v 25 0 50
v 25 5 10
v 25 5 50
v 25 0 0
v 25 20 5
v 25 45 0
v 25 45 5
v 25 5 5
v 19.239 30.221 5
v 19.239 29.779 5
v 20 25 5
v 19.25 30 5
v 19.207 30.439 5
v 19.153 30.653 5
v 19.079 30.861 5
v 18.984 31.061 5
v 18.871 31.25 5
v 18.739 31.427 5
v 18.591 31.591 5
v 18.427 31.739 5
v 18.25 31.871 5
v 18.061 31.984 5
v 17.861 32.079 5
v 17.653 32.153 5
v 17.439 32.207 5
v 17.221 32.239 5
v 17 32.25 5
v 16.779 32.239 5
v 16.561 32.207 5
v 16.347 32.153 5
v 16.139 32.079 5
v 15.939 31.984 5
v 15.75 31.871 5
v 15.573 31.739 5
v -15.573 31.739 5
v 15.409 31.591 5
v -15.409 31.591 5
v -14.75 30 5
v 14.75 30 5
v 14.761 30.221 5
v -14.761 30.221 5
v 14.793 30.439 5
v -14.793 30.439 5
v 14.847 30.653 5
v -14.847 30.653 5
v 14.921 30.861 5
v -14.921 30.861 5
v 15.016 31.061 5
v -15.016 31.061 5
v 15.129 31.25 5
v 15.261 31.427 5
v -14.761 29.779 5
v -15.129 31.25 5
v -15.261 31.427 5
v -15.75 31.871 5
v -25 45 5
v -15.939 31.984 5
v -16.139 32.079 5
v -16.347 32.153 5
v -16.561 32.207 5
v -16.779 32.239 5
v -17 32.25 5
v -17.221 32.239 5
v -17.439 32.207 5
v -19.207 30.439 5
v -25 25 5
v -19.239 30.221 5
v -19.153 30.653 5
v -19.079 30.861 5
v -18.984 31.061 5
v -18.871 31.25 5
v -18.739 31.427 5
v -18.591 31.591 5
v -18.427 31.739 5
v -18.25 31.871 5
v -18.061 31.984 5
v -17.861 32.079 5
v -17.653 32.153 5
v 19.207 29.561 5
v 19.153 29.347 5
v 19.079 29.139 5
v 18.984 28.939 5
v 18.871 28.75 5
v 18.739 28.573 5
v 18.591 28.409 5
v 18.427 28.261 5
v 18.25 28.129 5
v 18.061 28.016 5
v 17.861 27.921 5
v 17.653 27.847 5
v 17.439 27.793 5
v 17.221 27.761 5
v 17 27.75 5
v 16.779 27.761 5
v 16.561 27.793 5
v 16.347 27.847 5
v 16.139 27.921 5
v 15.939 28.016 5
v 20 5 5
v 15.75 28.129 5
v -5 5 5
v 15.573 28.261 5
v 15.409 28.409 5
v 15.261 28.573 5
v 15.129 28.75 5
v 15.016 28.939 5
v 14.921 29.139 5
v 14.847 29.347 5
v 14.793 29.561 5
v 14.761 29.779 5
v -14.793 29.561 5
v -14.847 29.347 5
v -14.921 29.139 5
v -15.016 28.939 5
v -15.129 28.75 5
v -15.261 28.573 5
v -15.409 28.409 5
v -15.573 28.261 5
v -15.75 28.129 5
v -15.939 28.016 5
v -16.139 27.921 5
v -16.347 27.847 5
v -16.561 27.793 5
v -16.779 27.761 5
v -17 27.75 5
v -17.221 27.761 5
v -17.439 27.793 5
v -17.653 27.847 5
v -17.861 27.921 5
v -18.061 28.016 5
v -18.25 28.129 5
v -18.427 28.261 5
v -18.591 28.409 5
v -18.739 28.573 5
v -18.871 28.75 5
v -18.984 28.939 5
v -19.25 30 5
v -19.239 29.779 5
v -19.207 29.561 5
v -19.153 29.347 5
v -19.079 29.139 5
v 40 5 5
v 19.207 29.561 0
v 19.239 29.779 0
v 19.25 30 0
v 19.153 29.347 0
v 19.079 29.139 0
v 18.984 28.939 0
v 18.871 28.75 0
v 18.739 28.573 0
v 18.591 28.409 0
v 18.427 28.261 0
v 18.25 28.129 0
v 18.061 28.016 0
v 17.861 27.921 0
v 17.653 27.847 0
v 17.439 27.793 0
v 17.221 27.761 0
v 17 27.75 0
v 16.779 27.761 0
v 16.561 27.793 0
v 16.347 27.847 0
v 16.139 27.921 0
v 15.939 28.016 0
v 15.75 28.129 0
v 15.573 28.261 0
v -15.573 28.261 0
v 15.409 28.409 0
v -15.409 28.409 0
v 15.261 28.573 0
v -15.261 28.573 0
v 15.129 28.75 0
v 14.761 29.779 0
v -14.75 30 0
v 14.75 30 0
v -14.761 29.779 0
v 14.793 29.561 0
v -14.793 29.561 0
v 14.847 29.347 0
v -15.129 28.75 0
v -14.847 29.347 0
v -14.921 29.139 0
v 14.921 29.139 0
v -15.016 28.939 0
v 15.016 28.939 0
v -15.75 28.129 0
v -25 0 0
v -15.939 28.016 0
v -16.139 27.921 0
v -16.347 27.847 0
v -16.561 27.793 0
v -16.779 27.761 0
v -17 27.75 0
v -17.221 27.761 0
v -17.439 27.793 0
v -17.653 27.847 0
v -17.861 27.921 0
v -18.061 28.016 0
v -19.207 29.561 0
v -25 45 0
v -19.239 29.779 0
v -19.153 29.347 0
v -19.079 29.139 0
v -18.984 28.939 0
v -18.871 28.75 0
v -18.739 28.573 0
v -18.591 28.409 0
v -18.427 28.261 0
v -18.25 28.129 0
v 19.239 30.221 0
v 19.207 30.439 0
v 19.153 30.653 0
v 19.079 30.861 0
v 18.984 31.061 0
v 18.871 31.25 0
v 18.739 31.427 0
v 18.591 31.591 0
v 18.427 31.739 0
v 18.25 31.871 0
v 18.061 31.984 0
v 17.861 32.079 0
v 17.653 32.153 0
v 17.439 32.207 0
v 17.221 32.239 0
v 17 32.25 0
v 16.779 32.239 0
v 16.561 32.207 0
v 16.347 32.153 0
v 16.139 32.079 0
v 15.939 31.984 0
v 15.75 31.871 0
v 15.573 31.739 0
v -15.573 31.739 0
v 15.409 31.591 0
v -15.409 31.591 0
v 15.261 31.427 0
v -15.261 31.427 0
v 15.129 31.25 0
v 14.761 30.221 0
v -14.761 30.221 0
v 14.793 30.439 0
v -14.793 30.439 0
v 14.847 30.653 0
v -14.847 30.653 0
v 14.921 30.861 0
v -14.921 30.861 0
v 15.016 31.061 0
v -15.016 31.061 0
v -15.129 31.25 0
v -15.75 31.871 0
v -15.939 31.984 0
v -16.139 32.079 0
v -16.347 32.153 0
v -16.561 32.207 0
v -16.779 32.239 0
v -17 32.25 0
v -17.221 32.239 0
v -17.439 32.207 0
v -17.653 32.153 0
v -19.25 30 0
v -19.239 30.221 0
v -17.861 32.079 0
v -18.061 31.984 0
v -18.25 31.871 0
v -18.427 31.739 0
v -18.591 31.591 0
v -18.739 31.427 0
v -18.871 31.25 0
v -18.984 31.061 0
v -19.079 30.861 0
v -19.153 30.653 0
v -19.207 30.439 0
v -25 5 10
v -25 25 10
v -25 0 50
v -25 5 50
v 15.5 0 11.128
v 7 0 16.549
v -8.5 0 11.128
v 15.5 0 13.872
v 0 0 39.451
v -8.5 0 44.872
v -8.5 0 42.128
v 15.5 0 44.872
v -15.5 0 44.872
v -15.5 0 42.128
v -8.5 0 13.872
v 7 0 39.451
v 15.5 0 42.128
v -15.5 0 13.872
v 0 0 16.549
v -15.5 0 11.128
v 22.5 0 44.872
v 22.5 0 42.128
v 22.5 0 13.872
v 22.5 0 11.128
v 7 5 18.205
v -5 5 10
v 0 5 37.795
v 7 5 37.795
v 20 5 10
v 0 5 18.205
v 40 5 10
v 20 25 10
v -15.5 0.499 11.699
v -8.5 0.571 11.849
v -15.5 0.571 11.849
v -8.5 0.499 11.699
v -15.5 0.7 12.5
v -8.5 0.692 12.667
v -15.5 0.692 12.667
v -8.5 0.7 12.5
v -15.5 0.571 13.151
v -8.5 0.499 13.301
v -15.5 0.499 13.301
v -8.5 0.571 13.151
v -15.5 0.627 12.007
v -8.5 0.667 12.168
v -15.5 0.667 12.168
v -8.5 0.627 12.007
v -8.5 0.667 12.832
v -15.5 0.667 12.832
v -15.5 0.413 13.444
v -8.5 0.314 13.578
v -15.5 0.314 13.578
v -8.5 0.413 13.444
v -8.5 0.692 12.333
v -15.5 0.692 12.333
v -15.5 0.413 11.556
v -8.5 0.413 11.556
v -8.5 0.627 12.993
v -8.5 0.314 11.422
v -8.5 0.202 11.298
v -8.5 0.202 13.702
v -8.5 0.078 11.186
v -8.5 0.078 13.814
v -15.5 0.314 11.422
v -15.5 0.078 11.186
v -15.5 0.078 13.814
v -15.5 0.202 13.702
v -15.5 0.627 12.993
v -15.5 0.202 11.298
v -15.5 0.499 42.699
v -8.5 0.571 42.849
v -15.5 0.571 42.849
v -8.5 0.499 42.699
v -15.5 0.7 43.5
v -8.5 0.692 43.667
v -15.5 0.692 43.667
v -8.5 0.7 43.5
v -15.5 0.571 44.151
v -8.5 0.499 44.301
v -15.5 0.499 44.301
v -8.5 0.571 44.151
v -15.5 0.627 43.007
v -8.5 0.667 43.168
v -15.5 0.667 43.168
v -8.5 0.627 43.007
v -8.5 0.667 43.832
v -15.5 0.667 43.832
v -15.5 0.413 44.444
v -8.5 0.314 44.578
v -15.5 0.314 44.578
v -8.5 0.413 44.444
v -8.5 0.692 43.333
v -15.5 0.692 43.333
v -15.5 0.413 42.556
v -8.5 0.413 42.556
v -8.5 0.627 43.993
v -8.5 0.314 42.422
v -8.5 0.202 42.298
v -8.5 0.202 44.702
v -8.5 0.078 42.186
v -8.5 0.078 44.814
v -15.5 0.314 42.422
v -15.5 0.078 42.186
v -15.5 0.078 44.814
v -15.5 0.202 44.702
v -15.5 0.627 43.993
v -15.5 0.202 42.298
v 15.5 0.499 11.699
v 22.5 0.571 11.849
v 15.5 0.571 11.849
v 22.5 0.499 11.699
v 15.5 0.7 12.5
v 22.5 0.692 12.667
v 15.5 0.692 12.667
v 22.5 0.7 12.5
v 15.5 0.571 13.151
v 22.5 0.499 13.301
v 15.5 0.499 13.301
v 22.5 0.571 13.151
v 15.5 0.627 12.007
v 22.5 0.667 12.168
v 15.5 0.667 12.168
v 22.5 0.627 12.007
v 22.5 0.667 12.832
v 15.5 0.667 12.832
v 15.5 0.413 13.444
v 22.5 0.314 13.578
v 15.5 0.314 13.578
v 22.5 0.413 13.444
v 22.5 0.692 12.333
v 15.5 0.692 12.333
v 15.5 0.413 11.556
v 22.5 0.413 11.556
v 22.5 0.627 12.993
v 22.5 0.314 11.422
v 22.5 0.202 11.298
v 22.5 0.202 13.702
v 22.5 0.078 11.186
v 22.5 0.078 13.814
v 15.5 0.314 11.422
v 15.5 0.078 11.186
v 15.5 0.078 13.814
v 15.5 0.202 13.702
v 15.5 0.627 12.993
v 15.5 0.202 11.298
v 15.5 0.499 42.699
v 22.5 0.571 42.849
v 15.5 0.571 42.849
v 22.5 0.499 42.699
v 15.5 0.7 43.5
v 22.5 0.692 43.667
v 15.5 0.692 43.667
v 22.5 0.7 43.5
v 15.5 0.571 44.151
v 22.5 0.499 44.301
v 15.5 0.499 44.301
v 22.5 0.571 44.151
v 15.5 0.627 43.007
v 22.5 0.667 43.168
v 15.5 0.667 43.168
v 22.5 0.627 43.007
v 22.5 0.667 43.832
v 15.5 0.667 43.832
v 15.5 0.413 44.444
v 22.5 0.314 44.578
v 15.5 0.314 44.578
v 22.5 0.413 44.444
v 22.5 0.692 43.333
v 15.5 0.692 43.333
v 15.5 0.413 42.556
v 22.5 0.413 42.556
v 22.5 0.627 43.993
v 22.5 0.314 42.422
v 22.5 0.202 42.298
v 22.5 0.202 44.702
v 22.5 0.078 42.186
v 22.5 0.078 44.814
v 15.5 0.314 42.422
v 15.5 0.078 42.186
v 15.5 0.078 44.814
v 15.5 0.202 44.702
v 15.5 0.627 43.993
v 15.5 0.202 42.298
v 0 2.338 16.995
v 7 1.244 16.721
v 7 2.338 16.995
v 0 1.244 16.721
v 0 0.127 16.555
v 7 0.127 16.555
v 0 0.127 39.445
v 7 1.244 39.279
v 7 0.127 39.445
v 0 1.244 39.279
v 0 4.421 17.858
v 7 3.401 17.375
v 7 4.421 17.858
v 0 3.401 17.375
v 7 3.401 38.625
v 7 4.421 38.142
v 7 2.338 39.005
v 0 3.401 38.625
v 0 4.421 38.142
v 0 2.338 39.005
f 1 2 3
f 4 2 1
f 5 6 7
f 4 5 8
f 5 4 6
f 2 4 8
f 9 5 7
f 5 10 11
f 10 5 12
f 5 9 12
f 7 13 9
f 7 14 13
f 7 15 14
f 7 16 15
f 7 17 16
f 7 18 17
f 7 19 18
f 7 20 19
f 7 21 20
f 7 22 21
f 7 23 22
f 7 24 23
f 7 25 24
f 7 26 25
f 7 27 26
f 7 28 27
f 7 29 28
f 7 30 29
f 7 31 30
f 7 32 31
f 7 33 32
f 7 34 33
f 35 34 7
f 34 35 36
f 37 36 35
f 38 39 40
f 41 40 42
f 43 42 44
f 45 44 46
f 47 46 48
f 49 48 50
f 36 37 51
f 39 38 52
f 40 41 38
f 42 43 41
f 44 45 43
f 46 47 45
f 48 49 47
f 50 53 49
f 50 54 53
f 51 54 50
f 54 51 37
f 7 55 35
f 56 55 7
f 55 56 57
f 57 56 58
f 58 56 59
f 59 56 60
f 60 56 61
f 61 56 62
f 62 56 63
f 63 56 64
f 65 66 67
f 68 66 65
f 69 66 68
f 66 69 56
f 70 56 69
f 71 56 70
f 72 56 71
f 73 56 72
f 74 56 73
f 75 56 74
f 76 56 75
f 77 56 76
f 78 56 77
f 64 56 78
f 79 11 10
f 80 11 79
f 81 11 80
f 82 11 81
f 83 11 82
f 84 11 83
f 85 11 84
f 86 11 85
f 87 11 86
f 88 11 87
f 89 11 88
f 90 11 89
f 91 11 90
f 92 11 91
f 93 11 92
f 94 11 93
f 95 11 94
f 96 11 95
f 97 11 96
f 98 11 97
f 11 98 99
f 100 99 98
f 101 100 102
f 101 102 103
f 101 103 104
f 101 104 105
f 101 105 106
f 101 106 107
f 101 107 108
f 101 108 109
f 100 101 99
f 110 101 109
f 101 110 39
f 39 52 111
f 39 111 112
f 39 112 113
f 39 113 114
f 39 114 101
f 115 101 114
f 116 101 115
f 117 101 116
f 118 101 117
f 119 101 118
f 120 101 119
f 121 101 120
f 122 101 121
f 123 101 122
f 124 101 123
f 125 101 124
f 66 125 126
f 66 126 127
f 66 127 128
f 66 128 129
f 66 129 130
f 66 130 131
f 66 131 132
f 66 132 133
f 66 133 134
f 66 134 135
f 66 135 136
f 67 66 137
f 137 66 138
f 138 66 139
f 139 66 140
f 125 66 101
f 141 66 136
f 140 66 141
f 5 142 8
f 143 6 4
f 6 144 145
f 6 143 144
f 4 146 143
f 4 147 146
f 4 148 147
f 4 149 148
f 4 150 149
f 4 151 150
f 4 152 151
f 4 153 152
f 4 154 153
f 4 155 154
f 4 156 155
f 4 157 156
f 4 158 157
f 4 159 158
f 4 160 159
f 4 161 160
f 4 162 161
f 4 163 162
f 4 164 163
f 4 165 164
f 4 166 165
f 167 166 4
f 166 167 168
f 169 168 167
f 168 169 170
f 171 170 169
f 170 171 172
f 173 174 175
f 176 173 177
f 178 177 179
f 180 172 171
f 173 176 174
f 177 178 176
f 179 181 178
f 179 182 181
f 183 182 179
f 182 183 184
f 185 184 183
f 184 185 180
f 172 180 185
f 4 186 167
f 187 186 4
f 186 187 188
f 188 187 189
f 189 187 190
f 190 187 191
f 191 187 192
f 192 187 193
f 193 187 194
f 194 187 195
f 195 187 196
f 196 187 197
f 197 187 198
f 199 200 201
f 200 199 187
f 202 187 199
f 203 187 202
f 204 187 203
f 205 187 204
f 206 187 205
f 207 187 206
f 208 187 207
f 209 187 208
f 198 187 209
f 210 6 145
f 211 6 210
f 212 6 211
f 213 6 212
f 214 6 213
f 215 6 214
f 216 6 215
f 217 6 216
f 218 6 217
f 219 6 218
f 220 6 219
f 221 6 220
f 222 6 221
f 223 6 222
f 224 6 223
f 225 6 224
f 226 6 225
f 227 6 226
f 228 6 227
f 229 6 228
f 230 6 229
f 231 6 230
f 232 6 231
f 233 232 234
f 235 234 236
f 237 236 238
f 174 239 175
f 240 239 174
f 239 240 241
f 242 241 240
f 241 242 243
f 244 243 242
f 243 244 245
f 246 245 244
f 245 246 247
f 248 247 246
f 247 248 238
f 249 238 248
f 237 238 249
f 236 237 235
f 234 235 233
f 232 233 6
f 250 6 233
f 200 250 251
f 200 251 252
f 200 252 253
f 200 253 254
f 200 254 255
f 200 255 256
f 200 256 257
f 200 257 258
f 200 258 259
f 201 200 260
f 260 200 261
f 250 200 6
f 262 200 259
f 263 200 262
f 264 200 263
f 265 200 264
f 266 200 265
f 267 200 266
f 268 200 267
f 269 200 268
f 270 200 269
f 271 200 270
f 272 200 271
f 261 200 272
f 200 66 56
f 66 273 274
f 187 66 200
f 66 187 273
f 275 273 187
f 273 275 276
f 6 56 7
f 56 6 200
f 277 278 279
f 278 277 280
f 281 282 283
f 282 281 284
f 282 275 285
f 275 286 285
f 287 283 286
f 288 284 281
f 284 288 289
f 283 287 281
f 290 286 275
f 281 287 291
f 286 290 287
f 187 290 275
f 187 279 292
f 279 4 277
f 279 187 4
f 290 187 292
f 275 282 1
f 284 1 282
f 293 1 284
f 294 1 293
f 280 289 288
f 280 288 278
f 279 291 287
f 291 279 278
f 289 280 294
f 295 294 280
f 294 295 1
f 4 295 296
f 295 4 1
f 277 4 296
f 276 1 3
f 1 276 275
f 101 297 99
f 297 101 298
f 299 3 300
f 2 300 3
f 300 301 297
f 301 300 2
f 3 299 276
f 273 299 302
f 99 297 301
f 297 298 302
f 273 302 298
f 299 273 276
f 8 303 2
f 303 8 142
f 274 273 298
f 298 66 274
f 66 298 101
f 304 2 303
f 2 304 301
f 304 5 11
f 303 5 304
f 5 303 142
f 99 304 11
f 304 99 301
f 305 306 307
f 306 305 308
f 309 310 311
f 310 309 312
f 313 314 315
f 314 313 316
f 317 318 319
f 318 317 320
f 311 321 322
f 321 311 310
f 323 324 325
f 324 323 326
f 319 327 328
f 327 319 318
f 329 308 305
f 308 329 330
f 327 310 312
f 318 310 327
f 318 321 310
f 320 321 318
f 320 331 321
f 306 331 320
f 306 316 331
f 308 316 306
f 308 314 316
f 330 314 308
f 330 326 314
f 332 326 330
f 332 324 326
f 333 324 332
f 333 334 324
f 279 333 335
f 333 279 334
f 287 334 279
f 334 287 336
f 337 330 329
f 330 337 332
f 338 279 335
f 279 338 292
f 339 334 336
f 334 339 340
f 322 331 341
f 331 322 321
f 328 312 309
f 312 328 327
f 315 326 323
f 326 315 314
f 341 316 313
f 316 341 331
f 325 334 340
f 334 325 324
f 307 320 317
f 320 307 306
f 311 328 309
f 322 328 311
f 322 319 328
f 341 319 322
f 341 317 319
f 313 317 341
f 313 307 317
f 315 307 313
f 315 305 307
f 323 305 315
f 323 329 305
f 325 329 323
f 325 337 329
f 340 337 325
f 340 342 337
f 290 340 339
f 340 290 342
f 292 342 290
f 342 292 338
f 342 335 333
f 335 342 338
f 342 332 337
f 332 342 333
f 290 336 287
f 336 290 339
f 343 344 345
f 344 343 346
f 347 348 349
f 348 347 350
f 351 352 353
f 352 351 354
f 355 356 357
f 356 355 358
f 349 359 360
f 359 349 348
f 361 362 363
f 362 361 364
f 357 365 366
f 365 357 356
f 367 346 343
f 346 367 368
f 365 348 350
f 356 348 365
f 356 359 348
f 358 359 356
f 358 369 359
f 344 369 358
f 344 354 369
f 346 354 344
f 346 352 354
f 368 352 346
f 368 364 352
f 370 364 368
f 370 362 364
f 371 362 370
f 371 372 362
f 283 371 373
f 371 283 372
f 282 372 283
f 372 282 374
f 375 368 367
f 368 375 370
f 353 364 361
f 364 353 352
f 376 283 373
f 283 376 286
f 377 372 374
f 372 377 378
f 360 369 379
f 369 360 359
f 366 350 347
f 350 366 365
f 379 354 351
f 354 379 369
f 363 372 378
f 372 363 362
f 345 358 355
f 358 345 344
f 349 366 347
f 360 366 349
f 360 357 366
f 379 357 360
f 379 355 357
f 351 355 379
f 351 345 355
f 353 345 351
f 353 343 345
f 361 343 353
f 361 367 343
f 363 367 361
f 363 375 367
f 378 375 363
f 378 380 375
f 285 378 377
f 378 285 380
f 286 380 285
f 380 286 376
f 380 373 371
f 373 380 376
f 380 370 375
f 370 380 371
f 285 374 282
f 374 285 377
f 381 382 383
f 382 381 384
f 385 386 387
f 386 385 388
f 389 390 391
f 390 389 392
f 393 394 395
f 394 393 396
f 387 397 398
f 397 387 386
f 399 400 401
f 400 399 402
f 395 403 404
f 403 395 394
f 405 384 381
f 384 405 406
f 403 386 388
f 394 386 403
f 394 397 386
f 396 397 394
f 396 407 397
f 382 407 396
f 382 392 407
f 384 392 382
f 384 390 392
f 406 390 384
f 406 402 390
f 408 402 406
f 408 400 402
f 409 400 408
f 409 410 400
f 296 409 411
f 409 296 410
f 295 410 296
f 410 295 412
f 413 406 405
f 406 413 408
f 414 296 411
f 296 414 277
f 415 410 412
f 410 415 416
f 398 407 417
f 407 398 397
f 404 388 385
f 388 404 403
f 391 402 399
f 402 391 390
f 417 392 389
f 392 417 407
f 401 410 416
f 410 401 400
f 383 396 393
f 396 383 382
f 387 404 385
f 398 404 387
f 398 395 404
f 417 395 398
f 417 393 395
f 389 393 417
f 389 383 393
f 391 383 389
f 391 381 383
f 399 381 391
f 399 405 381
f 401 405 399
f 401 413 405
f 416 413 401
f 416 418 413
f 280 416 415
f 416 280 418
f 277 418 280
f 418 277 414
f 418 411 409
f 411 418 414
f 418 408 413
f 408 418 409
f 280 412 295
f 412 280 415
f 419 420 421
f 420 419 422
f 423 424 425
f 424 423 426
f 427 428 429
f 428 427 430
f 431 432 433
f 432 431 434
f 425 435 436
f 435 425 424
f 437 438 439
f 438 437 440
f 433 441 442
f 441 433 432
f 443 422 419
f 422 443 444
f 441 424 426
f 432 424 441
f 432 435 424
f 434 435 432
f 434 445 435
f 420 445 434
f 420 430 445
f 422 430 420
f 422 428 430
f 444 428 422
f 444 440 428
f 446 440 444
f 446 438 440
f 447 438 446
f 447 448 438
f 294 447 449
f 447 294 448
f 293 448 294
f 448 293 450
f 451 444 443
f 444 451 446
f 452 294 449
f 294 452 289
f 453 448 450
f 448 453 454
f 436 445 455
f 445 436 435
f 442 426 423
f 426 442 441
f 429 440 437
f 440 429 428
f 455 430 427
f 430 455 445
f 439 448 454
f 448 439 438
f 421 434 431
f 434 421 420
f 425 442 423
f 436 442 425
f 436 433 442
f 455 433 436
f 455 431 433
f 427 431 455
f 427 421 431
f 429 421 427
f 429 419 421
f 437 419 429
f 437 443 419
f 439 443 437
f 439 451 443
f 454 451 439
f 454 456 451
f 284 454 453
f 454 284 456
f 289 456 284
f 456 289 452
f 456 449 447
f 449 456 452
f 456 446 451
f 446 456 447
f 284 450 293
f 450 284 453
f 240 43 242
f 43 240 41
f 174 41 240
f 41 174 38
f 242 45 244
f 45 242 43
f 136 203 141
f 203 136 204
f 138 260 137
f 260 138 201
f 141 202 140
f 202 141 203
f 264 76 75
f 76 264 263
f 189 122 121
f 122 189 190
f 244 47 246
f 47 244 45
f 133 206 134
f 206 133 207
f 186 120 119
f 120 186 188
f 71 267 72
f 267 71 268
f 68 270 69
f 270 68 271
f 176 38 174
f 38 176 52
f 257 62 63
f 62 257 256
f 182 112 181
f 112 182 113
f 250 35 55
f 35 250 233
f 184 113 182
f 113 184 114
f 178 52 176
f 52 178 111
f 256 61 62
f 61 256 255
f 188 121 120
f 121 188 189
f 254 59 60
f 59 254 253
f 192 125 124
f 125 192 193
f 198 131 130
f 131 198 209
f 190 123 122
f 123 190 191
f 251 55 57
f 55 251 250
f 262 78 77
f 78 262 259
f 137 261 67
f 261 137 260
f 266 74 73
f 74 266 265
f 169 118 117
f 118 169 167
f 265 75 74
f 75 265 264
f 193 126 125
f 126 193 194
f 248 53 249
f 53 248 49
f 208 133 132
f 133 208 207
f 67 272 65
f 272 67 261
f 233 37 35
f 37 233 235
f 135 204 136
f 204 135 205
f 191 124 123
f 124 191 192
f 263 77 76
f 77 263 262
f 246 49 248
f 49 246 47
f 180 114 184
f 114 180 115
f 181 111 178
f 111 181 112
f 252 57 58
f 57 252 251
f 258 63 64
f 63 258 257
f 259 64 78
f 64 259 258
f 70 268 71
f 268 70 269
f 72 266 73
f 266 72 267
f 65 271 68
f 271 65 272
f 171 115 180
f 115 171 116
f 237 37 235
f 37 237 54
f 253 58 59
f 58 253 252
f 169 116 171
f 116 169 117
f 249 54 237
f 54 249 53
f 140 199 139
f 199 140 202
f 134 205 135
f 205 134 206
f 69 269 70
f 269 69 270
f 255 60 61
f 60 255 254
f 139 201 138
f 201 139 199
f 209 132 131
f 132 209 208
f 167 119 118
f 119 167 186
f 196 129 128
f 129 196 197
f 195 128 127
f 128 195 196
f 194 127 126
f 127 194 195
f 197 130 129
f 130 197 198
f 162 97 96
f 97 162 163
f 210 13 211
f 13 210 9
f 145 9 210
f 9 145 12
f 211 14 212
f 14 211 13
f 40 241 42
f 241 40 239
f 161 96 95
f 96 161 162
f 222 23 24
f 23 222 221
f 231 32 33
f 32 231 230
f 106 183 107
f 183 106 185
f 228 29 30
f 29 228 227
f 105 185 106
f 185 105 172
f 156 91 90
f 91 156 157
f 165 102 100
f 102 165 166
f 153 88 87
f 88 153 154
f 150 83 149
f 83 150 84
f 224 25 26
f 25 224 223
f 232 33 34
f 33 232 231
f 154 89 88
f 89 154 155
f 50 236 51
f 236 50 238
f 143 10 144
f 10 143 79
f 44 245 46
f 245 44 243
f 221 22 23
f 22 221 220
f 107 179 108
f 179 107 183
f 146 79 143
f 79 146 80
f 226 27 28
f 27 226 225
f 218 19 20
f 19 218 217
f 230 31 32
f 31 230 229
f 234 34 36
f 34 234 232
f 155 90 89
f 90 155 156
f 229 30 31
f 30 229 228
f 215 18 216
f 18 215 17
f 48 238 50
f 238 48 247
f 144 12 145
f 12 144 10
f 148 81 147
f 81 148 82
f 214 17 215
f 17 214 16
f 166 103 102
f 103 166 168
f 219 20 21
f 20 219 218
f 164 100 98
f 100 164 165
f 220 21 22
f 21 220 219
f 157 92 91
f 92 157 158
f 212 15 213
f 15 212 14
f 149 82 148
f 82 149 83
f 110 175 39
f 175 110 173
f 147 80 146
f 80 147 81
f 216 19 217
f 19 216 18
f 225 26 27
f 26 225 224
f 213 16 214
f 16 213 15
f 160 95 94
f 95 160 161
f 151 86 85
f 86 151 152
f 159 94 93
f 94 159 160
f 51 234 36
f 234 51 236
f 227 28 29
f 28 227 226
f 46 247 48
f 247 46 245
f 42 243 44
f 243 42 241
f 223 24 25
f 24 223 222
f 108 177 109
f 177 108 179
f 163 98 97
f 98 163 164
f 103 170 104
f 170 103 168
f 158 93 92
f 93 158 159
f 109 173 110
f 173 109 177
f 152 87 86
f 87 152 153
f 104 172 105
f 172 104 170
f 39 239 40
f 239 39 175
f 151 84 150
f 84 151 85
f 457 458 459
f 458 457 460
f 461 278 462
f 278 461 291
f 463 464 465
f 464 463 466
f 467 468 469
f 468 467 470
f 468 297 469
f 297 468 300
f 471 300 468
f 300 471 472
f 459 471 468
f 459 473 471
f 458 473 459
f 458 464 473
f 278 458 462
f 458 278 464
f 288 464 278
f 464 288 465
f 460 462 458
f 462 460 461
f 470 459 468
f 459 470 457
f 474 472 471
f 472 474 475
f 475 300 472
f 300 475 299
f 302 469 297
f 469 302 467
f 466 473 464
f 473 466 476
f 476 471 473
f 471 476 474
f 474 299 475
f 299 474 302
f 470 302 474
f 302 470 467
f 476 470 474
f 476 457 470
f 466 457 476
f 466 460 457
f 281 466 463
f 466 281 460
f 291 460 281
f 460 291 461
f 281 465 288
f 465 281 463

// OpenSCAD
// L-shaped NEMA 17 Stepper Motor Mounting Bracket
// Corrected version: Gussets strictly contained within X [-25, 25]

// --- Dimensions ---
// Base Plate
base_x_min = -25;
base_x_max = 25;
base_y_min = 0;
base_y_max = 45;
base_z_max = 5;

// M4 Holes (Base)
m4_hole_d = 4.5;
m4_x1 = -17;
m4_y1 = 30;
m4_x2 = 17;
m4_y2 = 30;

// Vertical Motor Plate
vert_x_min = -25;
vert_x_max = 25;
vert_y_min = 0;
vert_y_max = 5;
vert_z_max = 50;

// Motor Boss Hole (Vertical Plate)
boss_d = 23;
boss_x = 0;
boss_z = 28;

// M3 Holes (Motor Plate)
m3_hole_d = 3.4;
m3_pattern_size = 31;

// Gussets
gusset_thick = 5;
gusset_leg_y = 20;
gusset_leg_z = 20;
gusset_y_start = 5; // Corner at y=5
gusset_z_start = 5; // Corner at z=5

$fn = 64;

// --- Modeling ---

module gusset_shape() {
    // Right triangle in YZ plane
    // Corner at (0,0) in local YZ coords
    polygon(points = [
        [0, 0],
        [gusset_leg_y, 0],
        [0, gusset_leg_z]
    ]);
}

difference() {
    union() {
        // Base Plate
        translate([base_x_min, base_y_min, 0])
            cube([base_x_max - base_x_min, base_y_max - base_y_min, base_z_max]);
        
        // Vertical Motor Plate
        translate([vert_x_min, vert_y_min, 0])
            cube([vert_x_max - vert_x_min, vert_y_max, vert_z_max]);
            
        // Gusset Left (Flush with x = -25, thickness 5mm)
        // Positioned from x = -25 to -20
        translate([base_x_min, gusset_y_start, gusset_z_start])
            linear_extrude(height = gusset_thick)
            gusset_shape();
            
        // Gusset Right (Flush with x = 25, thickness 5mm)
        // Positioned from x = 20 to 25
        translate([base_x_max - gusset_thick, gusset_y_start, gusset_z_start])
            linear_extrude(height = gusset_thick)
            gusset_shape();
    }

    // --- Subtractions ---

    // M4 Holes in Base Plate
    translate([m4_x1, m4_y1, -1]) 
        cylinder(h = base_z_max + 2, d = m4_hole_d);
    translate([m4_x2, m4_y2, -1]) 
        cylinder(h = base_z_max + 2, d = m4_hole_d);

    // Motor Boss Hole (Through the vertical plate along Y)
    translate([boss_x, -1, boss_z])
        rotate([0, 90, 0])
        cylinder(h = vert_y_max + 2, d = boss_d);

    // M3 Screw Holes (4 holes on 31mm square pattern)
    for (sx = [-1, 1], sy = [-1, 1]) {
        translate([sx * (m3_pattern_size / 2), -1, boss_z + sy * (m3_pattern_size / 2)])
            rotate([0, 90, 0])
            cylinder(h = vert_y_max + 2, d = m3_hole_d);
    }
}
